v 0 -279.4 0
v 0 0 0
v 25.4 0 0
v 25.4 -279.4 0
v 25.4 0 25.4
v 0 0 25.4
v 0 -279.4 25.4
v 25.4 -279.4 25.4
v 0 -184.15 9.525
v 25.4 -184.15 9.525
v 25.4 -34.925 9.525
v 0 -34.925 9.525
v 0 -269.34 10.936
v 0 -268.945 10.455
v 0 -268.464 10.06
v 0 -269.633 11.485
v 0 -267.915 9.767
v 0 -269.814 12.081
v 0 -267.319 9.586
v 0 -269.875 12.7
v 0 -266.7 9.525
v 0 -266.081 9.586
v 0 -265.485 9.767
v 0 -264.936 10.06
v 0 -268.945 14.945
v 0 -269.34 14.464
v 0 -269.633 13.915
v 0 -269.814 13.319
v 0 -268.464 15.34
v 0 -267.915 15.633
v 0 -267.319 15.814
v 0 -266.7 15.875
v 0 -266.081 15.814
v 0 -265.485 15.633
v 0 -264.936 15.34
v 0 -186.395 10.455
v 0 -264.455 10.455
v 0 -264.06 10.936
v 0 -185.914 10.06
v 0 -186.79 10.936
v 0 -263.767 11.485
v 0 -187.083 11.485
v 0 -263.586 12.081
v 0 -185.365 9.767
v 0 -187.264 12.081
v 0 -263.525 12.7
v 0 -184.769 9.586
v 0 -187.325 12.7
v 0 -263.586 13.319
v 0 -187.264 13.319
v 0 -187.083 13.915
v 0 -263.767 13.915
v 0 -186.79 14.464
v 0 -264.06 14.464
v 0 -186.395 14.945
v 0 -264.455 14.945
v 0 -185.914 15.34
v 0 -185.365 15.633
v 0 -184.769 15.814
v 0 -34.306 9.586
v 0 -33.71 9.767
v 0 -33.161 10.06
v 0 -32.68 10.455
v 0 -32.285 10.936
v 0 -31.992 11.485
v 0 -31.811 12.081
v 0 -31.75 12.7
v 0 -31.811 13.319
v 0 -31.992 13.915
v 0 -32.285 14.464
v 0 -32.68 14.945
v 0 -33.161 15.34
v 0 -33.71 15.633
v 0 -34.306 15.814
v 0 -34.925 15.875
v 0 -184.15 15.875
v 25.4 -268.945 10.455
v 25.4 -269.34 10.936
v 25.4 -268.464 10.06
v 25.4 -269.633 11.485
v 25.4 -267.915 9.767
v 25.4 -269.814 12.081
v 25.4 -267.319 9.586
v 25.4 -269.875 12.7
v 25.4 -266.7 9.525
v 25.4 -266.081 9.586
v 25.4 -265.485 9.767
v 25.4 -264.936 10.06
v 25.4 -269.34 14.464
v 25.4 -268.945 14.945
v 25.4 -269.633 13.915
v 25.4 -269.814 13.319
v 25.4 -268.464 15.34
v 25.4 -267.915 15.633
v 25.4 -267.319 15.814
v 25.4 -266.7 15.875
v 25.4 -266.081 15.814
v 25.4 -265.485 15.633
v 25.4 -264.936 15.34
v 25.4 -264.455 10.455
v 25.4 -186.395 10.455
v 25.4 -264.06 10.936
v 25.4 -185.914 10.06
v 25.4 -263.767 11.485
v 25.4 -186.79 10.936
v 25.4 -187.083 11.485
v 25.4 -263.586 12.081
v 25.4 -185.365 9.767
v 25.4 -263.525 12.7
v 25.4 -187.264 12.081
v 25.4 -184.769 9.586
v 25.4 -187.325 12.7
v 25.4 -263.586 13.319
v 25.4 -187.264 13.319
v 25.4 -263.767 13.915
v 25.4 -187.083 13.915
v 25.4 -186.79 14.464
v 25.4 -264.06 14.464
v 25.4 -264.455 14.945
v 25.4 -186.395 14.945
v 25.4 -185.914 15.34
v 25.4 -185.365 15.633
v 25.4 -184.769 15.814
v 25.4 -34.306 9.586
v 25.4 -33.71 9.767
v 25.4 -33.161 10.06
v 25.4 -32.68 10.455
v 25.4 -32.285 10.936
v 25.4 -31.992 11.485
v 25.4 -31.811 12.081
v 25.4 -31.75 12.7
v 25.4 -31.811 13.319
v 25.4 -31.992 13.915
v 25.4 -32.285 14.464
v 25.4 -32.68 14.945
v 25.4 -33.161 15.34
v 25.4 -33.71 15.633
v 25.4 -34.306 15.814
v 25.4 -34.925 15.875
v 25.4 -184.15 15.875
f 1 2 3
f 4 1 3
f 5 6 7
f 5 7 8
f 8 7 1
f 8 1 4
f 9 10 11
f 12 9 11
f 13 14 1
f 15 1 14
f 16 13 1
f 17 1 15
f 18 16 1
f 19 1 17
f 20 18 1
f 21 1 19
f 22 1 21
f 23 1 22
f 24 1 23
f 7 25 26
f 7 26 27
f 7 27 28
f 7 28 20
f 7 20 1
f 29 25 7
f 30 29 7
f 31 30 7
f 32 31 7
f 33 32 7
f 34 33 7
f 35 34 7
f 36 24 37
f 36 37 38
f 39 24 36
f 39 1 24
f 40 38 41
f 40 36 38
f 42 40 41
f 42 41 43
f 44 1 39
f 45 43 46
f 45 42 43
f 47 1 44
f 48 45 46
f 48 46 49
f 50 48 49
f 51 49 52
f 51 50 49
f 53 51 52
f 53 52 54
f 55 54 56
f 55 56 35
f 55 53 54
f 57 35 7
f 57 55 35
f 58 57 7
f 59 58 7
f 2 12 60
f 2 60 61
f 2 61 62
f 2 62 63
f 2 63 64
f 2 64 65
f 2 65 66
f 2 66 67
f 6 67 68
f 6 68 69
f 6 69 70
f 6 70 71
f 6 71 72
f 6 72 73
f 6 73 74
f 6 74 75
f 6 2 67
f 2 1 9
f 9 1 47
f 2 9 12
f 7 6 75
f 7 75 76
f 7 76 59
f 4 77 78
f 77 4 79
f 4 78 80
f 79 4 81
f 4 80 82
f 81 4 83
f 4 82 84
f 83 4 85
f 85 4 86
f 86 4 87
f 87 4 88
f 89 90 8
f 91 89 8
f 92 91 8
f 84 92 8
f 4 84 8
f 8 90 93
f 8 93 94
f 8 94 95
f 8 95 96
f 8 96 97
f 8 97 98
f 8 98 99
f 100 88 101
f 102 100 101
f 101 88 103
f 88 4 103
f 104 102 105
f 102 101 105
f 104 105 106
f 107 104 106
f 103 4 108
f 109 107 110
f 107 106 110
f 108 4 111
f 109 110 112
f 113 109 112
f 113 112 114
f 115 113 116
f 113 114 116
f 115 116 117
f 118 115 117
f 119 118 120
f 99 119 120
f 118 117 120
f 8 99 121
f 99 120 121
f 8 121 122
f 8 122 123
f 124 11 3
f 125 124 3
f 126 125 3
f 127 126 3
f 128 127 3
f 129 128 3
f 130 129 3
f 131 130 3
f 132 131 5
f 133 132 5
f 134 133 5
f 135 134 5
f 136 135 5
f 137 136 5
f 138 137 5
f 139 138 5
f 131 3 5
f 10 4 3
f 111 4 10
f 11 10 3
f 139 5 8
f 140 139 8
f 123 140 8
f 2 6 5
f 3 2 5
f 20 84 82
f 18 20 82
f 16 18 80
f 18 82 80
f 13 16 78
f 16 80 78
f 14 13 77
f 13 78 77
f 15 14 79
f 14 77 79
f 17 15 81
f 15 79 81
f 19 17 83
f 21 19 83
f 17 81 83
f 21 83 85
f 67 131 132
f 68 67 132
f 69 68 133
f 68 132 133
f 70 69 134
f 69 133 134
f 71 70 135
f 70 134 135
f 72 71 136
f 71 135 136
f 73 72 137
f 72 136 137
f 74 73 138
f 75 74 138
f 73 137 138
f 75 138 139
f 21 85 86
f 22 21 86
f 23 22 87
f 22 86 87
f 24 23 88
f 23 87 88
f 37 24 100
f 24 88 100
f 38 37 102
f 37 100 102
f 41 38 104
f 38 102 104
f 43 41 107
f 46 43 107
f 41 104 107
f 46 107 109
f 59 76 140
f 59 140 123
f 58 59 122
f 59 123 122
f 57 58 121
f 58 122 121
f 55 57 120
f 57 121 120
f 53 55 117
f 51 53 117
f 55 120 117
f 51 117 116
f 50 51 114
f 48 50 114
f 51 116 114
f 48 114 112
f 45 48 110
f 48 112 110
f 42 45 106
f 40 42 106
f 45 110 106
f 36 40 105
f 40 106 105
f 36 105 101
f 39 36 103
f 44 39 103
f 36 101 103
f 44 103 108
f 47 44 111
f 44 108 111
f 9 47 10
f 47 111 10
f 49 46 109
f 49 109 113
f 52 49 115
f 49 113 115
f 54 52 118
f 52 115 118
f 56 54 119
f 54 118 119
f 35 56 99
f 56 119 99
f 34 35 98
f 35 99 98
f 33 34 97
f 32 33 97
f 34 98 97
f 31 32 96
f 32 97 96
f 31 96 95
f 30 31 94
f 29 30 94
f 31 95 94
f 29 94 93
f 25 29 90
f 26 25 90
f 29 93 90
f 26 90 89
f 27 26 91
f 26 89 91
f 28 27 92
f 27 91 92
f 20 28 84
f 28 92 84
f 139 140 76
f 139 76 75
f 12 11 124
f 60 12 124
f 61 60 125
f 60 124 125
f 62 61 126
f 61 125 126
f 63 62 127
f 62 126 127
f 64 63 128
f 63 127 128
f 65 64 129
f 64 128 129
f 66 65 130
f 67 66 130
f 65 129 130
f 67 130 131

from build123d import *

# Parameters (mm, degrees)
F0_W     = 25.4
F0_H     = 25.4
F1_DEPTH = 279.4
F2_W     = 149.225
F2_H     = 6.35
F3_DEPTH = 25.4


with BuildPart() as f1:
    # F0 (on Front) → F1 (new body)
    with BuildSketch(Plane.XZ):
        with Locations((12.7, 12.7)):
            Rectangle(F0_W, F0_H)
    extrude(amount=F1_DEPTH)

    # F2 (on face) → F3 (cut)
    with BuildSketch(Plane.YZ.offset(25.4)):
        with BuildLine():
            ThreePointArc((-263.525, 12.7), (-266.7, 15.875), (-269.875, 12.7))
            Line((-269.875, 12.7), (-266.7, 12.7))
            Line((-266.7, 12.7), (-266.7, 9.525))
            ThreePointArc((-266.7, 9.525), (-264.454936, 10.454936), (-263.525, 12.7))
        make_face()
        with BuildLine():
            Line((-266.7, 12.7), (-269.875, 12.7))
            ThreePointArc((-269.875, 12.7), (-268.945064, 10.454936), (-266.7, 9.525))
            Line((-266.7, 9.525), (-266.7, 12.7))
        make_face()
        with BuildLine():
            ThreePointArc((-184.15, 15.875), (-187.325, 12.7), (-184.15, 9.525))
            Line((-184.15, 9.525), (-184.15, 15.875))
        make_face()
        with Locations((-109.5375, 12.7)):
            Rectangle(F2_W, F2_H)
        with BuildLine():
            ThreePointArc((-34.925, 9.525), (-32.679936, 10.454936), (-31.75, 12.7))
            ThreePointArc((-31.75, 12.7), (-32.679936, 14.945064), (-34.925, 15.875))
            Line((-34.925, 15.875), (-34.925, 9.525))
        make_face()
    extrude(amount=-F3_DEPTH, mode=Mode.SUBTRACT)


solid = f1.part
